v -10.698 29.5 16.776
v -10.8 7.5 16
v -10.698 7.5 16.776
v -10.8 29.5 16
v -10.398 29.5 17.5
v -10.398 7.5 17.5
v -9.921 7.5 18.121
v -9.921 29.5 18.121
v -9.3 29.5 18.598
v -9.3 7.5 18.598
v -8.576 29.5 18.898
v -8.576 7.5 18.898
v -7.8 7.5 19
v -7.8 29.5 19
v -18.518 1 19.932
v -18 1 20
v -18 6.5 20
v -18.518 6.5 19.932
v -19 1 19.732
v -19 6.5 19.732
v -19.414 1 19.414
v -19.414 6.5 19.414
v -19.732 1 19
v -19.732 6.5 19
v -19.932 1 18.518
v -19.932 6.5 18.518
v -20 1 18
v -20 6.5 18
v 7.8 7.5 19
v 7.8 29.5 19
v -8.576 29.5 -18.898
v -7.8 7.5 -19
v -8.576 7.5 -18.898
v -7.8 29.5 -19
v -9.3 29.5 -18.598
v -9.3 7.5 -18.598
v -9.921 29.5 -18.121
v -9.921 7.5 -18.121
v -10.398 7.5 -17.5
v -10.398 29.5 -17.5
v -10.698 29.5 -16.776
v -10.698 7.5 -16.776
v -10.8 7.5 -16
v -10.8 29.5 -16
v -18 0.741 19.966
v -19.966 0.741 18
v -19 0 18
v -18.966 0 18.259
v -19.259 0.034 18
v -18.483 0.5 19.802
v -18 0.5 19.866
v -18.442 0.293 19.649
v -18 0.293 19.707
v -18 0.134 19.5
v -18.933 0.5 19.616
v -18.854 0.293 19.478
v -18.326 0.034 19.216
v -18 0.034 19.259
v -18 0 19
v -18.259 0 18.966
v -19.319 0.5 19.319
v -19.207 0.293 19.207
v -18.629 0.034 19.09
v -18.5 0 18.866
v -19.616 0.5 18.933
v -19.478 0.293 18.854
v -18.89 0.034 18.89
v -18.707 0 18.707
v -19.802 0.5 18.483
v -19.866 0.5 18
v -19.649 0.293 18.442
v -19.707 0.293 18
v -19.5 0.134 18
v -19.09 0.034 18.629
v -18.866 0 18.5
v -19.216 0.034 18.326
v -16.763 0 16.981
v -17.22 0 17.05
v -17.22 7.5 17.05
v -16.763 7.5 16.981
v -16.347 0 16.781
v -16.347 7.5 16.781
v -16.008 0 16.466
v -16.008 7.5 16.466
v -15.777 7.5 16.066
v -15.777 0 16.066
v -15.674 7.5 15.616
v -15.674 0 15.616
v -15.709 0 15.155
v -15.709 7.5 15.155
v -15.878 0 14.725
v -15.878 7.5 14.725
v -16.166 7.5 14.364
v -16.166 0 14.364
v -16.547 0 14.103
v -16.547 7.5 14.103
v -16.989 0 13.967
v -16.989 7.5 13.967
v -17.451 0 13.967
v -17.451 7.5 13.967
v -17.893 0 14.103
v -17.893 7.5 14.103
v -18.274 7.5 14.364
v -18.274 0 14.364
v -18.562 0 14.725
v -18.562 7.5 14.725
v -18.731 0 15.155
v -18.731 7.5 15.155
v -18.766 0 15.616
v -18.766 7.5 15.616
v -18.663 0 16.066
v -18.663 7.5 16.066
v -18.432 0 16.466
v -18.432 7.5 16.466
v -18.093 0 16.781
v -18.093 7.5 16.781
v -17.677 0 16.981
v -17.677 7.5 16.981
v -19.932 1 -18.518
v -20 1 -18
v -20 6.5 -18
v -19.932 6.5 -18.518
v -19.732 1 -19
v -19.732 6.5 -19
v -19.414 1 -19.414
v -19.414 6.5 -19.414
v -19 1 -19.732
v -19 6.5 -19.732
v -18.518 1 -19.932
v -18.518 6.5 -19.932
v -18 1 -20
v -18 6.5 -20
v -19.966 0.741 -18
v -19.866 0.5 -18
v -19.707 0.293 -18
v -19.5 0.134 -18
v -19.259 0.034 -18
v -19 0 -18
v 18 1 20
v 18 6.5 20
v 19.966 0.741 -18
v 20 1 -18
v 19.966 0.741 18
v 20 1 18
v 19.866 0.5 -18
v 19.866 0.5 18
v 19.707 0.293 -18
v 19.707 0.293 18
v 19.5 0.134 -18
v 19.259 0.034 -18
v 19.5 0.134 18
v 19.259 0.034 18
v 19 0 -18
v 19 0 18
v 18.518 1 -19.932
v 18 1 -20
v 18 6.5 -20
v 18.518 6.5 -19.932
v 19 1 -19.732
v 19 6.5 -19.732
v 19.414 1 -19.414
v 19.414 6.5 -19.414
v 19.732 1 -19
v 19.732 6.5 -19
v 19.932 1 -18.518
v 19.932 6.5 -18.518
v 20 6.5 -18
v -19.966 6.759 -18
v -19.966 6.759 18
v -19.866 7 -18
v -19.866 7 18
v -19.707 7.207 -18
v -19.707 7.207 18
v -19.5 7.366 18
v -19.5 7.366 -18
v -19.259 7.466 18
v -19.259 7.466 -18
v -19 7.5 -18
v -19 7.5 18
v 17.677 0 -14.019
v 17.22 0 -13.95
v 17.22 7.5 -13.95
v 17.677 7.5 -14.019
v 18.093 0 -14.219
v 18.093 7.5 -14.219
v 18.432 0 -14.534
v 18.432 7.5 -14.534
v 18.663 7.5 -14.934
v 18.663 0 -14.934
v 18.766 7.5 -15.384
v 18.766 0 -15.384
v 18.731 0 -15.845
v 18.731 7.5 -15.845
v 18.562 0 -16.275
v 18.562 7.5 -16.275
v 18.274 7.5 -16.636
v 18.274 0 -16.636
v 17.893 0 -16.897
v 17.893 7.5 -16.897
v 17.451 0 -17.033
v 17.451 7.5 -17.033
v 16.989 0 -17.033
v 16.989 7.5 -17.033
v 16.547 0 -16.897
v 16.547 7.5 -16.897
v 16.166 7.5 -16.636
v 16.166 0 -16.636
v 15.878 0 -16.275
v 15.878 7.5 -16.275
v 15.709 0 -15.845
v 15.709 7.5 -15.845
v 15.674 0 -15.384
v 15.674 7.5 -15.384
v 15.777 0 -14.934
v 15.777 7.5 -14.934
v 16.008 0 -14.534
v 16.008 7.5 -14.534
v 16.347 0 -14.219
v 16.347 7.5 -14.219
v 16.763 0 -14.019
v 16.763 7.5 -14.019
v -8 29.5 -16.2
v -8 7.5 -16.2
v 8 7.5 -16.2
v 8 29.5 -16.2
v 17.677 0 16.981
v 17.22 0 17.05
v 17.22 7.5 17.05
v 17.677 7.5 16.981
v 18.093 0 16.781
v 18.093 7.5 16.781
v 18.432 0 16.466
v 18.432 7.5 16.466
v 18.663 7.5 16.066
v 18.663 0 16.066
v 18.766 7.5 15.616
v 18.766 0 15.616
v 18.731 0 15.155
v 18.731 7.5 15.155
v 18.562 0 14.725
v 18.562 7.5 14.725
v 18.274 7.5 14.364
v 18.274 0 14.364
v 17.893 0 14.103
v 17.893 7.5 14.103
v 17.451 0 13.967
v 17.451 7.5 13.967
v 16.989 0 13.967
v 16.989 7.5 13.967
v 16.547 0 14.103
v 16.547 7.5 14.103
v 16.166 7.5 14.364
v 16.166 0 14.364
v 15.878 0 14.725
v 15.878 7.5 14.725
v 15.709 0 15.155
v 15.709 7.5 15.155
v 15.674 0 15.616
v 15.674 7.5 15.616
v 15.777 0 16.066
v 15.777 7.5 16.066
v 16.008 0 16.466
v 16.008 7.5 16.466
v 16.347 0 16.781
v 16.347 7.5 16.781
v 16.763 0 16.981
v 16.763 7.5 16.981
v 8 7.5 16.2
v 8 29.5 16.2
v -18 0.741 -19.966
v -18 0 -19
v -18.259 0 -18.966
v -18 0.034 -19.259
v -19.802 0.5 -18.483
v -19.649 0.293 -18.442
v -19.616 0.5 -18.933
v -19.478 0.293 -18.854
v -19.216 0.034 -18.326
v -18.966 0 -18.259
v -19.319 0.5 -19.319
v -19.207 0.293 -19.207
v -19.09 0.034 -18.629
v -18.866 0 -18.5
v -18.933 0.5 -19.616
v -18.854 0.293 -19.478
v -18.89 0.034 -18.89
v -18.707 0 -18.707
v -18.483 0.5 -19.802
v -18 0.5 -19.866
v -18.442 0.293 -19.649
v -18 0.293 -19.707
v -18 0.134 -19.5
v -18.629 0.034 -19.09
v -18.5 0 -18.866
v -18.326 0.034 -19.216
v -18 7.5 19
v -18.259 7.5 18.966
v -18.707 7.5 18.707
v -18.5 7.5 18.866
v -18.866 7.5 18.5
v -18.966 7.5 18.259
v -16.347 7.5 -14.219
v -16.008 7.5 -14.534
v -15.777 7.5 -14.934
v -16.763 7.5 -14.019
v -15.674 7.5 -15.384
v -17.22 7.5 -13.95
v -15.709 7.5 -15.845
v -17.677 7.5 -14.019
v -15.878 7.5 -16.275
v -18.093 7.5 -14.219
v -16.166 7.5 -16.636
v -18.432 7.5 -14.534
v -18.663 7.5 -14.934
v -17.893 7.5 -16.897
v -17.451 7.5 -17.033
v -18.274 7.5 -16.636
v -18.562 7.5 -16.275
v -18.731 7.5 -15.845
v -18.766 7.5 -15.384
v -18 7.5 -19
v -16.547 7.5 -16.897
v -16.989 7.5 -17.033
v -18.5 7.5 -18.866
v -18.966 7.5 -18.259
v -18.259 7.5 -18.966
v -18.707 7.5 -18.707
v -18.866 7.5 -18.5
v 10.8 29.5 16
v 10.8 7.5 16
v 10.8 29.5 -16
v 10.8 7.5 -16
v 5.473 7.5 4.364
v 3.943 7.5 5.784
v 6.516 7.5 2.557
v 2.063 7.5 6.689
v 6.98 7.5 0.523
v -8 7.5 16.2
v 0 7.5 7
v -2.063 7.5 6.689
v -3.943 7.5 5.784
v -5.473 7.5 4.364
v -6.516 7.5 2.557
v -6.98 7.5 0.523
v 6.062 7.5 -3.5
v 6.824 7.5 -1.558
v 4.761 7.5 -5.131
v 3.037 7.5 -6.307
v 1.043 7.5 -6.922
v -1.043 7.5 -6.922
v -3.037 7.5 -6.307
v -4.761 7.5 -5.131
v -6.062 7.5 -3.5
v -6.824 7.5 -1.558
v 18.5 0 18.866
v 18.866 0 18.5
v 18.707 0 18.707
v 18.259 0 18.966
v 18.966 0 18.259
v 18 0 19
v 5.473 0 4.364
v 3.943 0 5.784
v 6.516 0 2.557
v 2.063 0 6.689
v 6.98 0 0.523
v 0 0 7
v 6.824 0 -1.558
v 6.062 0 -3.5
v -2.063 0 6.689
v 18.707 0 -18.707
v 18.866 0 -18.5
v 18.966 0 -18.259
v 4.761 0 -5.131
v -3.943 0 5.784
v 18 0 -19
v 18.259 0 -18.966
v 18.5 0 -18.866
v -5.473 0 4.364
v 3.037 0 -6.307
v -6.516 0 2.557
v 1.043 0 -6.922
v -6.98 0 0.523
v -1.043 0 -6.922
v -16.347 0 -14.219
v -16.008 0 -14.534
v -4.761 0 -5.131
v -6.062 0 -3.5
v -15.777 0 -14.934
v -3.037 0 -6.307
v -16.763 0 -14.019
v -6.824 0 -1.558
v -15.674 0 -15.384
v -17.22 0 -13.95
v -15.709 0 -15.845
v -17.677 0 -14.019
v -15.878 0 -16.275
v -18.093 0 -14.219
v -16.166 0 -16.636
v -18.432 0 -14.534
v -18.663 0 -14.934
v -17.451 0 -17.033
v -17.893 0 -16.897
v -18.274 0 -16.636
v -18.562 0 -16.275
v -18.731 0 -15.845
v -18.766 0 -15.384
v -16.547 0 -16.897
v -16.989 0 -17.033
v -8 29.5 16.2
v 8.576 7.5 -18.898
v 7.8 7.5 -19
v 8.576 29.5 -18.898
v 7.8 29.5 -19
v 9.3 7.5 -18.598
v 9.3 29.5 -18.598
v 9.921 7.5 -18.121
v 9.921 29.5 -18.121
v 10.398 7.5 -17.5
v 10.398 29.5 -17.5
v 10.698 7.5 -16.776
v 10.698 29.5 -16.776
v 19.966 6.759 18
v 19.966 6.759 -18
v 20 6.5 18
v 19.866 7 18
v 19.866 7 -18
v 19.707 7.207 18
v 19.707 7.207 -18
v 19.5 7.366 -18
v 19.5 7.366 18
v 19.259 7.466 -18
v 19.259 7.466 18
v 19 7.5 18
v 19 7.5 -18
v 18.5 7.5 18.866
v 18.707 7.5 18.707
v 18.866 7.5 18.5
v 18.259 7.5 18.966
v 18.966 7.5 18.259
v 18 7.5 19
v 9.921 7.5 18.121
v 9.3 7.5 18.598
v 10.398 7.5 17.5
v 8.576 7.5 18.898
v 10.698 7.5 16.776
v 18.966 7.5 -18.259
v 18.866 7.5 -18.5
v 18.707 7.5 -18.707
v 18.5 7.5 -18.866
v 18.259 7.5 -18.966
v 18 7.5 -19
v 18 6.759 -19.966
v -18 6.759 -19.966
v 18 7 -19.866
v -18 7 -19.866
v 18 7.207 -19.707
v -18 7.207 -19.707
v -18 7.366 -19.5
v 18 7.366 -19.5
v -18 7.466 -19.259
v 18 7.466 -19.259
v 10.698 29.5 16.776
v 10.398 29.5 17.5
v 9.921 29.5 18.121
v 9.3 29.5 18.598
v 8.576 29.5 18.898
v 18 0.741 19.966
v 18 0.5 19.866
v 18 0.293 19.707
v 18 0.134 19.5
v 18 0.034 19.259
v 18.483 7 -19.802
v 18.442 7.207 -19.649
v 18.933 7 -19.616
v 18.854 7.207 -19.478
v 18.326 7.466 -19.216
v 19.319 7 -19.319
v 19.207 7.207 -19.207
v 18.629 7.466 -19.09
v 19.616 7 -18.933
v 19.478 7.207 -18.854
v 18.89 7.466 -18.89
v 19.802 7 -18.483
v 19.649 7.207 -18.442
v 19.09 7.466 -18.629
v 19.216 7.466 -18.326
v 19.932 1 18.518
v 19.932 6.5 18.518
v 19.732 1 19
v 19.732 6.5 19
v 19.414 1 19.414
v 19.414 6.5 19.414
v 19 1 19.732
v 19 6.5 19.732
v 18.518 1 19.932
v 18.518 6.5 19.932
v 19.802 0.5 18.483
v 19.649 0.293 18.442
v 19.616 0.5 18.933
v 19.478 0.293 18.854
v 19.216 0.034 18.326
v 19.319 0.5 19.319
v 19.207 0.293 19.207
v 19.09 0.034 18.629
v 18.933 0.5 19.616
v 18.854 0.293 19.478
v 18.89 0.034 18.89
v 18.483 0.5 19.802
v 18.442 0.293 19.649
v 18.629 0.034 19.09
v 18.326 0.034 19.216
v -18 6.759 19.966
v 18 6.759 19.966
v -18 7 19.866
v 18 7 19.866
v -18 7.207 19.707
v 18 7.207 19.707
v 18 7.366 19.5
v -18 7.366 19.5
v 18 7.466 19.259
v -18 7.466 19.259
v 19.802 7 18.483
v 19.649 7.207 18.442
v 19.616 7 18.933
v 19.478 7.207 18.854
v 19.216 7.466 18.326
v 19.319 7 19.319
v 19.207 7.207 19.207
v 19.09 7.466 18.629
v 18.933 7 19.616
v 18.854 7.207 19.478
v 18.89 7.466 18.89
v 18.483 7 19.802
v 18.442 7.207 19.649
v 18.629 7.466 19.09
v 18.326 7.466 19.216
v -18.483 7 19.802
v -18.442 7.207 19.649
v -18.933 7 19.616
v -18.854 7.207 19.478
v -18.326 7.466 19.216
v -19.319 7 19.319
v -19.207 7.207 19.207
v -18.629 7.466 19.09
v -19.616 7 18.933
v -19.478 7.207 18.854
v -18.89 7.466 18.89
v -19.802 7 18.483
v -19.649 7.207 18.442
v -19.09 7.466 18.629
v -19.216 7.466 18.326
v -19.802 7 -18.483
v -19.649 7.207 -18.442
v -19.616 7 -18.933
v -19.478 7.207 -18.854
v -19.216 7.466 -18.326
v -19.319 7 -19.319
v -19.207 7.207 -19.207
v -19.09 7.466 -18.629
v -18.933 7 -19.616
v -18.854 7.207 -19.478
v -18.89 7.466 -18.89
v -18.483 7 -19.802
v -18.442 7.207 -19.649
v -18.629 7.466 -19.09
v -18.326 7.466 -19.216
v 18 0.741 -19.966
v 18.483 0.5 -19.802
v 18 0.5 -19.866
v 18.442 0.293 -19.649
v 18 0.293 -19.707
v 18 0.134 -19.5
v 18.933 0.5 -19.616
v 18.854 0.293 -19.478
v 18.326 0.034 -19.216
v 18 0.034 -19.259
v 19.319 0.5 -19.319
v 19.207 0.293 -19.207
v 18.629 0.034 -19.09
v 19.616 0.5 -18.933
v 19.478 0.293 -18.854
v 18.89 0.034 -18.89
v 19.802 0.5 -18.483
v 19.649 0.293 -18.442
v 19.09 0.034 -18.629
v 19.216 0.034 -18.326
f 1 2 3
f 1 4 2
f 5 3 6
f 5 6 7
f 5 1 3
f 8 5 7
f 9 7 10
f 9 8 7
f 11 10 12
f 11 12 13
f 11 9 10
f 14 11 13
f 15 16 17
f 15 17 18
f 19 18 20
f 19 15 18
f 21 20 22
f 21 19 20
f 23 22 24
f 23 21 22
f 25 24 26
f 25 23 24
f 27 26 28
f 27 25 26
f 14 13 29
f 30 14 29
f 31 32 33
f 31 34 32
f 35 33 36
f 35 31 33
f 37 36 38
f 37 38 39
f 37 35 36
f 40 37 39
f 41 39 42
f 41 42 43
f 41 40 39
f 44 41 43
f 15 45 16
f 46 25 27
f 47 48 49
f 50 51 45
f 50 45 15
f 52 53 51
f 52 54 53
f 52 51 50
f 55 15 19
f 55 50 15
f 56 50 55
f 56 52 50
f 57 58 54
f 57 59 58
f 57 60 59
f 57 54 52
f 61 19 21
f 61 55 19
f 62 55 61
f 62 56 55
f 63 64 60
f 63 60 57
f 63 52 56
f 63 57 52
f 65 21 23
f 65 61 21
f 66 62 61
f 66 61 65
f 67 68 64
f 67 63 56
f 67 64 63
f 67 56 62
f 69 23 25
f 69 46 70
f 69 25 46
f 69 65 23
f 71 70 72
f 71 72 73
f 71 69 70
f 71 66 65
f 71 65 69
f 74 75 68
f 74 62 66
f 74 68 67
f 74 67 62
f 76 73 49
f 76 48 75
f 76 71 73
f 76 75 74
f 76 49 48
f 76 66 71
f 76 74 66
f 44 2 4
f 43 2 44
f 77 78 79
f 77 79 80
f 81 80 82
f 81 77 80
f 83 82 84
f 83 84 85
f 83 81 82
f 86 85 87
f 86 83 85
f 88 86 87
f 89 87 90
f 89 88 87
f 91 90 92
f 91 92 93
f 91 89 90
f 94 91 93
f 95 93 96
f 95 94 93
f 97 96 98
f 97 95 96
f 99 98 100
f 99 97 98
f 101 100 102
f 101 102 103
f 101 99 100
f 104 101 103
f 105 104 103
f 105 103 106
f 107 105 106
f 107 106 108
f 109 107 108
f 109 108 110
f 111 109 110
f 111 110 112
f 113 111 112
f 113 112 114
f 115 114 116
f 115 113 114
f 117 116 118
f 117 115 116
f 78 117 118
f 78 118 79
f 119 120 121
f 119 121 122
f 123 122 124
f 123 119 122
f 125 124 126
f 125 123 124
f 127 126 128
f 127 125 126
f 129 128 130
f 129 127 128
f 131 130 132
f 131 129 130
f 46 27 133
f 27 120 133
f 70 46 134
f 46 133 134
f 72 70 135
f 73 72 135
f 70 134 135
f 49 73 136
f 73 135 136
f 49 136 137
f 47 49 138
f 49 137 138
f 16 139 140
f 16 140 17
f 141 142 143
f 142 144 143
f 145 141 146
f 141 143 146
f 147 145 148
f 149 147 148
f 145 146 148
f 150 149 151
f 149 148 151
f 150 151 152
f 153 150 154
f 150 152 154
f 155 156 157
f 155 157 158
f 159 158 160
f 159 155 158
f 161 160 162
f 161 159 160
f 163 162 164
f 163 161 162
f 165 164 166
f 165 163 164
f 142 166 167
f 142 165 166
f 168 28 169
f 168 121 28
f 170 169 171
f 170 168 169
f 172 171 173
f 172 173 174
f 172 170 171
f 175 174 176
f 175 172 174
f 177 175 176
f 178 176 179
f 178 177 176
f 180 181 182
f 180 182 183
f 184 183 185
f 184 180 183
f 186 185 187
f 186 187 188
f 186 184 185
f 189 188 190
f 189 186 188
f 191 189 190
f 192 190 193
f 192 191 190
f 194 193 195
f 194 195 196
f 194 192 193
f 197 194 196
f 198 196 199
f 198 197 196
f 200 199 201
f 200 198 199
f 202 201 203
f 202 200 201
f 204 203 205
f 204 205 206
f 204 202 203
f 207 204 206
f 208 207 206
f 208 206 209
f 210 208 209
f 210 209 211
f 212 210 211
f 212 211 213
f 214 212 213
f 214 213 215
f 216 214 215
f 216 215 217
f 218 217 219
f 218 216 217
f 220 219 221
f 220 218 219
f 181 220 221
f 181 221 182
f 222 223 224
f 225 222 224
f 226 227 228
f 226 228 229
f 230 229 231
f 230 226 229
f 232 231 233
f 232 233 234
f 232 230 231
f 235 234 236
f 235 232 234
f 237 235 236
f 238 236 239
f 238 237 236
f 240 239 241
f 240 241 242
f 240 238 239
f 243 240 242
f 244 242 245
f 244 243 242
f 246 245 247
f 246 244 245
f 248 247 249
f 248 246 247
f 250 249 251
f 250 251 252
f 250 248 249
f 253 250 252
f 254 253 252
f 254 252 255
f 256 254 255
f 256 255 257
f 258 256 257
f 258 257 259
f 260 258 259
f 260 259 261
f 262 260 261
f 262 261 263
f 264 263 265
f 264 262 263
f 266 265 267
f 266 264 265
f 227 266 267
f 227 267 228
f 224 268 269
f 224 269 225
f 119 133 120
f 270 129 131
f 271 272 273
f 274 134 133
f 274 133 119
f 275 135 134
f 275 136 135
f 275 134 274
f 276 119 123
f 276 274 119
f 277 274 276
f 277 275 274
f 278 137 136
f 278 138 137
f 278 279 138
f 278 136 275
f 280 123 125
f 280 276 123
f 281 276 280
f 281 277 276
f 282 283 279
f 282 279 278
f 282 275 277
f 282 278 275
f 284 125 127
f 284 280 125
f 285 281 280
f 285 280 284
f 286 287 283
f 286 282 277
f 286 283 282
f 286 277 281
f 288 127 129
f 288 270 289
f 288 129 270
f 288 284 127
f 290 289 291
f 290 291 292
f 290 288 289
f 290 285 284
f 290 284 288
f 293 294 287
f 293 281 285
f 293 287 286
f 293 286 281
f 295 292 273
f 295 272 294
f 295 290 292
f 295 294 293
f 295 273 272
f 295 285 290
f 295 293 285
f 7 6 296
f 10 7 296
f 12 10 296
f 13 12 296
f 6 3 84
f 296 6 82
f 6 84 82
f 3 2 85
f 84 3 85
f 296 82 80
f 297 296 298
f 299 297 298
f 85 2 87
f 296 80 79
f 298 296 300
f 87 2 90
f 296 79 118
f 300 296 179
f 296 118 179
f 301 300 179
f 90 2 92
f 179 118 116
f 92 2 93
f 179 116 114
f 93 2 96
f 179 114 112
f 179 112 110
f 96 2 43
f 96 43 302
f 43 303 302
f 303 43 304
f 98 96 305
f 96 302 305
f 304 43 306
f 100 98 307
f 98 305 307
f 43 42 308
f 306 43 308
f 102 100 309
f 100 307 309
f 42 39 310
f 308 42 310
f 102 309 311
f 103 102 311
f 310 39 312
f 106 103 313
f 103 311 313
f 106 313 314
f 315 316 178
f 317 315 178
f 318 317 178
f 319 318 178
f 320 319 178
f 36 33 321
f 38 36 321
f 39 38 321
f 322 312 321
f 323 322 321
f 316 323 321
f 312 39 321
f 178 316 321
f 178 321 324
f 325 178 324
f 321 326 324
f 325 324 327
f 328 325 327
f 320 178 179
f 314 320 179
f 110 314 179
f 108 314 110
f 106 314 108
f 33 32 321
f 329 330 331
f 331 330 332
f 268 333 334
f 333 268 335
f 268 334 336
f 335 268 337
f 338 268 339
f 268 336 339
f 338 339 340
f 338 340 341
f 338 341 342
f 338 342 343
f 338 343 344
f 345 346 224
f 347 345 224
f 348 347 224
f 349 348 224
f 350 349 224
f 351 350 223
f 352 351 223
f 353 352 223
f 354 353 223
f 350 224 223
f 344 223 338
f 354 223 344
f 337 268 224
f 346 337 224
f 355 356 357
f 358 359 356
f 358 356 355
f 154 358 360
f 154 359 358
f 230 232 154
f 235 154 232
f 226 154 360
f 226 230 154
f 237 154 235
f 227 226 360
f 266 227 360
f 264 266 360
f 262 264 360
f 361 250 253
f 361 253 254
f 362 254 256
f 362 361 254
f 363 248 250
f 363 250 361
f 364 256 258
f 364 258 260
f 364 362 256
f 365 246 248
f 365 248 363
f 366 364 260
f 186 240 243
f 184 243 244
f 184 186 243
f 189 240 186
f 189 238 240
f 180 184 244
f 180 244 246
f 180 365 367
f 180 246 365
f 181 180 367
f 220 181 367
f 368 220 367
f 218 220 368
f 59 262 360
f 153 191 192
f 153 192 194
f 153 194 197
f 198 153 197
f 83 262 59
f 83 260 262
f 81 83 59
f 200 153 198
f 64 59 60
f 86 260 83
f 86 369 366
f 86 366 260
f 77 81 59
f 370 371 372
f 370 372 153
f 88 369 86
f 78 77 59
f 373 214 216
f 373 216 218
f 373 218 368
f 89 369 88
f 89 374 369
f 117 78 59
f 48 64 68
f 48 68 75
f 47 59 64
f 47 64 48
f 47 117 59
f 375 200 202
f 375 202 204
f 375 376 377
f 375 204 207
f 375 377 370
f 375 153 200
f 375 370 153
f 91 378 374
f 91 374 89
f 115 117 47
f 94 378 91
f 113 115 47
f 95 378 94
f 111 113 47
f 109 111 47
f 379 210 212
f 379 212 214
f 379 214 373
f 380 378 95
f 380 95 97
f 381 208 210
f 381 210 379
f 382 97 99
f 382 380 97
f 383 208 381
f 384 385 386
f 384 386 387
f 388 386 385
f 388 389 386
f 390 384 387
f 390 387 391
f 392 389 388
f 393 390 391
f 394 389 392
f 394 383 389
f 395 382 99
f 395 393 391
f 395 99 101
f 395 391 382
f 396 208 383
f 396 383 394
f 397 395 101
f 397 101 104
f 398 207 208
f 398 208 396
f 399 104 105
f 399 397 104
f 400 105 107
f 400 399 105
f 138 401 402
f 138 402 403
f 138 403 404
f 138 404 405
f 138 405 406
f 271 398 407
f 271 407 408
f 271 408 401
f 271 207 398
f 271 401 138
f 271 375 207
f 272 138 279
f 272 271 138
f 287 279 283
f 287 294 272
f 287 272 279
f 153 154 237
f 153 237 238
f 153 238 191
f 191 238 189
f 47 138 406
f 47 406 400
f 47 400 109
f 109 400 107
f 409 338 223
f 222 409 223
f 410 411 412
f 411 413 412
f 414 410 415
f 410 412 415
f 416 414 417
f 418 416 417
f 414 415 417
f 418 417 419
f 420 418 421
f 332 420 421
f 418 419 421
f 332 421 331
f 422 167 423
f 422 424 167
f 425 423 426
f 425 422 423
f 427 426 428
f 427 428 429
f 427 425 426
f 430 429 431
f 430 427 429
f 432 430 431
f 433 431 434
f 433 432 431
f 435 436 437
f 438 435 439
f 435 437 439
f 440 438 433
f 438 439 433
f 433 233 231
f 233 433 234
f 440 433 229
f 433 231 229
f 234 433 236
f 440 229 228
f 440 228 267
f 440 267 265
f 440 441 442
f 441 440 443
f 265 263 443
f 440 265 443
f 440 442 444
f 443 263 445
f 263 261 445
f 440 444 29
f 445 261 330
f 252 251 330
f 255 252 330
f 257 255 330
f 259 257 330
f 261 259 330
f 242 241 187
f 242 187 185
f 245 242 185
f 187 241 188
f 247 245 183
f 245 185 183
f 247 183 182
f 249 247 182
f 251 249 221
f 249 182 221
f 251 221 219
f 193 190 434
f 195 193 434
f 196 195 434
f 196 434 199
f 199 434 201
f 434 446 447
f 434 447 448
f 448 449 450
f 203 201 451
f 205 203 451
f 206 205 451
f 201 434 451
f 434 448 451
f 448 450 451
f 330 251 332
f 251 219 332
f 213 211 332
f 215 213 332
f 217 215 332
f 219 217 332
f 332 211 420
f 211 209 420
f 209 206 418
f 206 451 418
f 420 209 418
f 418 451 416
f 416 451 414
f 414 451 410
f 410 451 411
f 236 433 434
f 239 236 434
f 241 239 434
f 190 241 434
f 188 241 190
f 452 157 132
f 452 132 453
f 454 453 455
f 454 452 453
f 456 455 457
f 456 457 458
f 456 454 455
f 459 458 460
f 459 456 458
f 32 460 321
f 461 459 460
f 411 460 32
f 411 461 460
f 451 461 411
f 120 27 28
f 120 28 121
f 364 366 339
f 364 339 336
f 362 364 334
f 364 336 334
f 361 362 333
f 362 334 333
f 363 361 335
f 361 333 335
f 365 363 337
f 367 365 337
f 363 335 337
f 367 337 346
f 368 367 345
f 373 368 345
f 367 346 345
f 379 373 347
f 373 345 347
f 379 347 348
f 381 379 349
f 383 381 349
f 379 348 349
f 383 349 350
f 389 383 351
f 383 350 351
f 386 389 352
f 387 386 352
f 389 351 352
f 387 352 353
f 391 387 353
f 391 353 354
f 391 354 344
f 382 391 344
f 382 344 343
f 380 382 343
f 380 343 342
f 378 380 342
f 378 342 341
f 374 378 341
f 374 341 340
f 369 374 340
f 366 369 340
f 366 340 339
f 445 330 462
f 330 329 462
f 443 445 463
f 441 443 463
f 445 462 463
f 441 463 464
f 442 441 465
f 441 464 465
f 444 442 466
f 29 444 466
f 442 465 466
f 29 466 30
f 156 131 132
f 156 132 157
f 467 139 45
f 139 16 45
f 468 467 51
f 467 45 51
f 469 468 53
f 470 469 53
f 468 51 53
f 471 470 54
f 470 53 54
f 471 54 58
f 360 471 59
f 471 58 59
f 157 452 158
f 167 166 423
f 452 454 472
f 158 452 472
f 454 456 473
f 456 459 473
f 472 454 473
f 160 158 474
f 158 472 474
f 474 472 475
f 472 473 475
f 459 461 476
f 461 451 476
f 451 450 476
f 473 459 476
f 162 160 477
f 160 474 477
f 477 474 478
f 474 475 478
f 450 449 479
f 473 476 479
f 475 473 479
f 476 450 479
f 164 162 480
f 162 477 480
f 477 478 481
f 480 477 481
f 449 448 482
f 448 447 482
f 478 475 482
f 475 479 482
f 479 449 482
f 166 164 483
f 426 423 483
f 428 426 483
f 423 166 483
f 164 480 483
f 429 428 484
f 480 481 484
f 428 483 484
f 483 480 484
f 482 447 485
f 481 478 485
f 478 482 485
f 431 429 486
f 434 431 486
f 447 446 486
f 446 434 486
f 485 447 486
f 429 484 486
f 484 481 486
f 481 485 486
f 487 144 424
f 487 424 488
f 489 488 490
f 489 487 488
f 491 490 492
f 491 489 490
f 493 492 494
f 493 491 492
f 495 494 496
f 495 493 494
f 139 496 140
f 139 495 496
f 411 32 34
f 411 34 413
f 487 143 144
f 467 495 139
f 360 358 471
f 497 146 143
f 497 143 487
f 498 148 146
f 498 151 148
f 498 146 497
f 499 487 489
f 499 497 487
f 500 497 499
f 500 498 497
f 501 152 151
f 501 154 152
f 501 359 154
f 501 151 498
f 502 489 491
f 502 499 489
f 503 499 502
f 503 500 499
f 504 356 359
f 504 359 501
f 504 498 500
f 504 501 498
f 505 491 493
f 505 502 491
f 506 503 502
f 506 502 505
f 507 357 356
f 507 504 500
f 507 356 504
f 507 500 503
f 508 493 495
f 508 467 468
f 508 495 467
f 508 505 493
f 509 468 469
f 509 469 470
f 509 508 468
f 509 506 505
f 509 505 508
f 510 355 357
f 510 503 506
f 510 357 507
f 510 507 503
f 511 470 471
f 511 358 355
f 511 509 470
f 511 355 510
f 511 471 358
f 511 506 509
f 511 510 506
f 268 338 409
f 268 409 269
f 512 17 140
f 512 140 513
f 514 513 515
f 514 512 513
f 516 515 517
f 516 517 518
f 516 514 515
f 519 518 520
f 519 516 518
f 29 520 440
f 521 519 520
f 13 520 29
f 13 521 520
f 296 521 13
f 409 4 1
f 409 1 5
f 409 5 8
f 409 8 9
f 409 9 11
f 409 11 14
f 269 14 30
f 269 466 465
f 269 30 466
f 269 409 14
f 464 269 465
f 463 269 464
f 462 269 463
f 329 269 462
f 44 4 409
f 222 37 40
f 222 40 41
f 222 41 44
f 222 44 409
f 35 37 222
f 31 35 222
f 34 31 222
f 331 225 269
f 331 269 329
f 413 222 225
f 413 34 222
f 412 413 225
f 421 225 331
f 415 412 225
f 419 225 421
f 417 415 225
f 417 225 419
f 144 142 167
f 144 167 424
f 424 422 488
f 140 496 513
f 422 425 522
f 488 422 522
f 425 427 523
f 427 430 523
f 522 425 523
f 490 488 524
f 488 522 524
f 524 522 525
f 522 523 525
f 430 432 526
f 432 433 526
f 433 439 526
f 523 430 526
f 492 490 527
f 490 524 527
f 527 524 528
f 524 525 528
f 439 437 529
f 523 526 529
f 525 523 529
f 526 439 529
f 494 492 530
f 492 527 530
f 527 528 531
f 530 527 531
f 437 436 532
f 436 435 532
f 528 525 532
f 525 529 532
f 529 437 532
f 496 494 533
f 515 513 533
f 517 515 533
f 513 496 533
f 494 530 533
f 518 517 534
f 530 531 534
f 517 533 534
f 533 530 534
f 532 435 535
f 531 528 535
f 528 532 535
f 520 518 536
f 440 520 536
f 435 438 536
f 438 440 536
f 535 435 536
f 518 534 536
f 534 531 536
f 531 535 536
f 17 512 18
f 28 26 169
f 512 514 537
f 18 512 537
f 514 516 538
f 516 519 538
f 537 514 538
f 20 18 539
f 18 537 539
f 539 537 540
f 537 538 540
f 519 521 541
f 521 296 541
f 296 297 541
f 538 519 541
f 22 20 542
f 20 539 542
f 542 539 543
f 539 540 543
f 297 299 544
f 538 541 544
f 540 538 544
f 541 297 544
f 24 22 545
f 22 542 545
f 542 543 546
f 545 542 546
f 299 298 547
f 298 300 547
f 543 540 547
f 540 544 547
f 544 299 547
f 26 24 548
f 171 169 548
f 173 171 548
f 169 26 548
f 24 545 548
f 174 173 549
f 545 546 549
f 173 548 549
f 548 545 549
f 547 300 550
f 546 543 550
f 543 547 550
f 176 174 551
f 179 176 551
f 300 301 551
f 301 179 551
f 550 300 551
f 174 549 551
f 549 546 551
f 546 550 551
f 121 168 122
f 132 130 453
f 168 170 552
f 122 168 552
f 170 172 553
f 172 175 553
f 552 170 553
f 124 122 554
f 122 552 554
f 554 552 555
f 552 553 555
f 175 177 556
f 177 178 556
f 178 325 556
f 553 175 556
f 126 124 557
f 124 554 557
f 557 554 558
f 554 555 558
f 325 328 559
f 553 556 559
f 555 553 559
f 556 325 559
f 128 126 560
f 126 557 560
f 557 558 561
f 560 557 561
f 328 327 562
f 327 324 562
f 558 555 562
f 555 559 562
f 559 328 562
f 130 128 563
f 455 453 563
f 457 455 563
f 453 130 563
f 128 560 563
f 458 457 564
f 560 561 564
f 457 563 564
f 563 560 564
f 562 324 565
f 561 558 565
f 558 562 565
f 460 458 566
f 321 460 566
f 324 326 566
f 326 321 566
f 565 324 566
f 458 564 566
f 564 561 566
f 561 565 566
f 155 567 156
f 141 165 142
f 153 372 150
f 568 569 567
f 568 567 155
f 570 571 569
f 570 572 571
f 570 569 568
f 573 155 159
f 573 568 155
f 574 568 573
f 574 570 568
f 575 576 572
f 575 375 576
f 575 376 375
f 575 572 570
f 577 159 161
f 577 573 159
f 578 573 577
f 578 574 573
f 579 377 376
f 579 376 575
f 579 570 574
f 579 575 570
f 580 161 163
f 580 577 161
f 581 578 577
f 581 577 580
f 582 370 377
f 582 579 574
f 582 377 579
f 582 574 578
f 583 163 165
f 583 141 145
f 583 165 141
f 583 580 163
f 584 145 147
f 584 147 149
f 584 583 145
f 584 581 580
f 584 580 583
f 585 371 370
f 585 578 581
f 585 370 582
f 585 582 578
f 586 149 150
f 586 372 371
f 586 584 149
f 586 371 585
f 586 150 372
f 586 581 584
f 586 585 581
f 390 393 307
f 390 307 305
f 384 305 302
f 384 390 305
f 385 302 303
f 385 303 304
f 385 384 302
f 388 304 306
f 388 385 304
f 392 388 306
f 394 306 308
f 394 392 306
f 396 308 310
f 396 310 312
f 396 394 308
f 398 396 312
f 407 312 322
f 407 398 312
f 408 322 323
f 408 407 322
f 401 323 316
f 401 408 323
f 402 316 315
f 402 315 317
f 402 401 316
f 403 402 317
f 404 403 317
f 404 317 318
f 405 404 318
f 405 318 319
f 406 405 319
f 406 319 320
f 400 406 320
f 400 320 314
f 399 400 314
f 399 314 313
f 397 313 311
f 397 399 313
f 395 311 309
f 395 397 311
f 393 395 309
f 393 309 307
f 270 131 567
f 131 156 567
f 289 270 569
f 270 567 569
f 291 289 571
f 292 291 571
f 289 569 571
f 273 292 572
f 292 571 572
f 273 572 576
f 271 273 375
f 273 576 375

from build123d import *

# Parameters (mm, degrees)
SKETCH1_R           = 1.55
BOSS_EXTRUDE1_DEPTH = 7.5
FILLET2_R           = 1
SKETCH2_R           = 7
CUT_EXTRUDE1_DEPTH  = 10
SKETCH3_W           = 21.6
SKETCH3_H           = 38
SKETCH3_W_2         = 16
SKETCH3_H_2         = 32.4
BOSS_EXTRUDE9_DEPTH = 22
FILLET6_R           = 3


with BuildPart() as part:
    # Sketch1 → Boss-Extrude1 (new body)
    with BuildSketch(Plane(origin=(0, 0, 0), x_dir=(1, 0, 0), z_dir=(0, 1, 0))):
        with BuildLine():
            Line((-18, 20), (18, 20))
            ThreePointArc((18, 20), (19.414213562, 19.414213562), (20, 18))
            Line((20, 18), (20, -18))
            ThreePointArc((20, -18), (19.414213562, -19.414213562), (18, -20))
            Line((18, -20), (-18, -20))
            ThreePointArc((-18, -20), (-19.414213562, -19.414213562), (-20, -18))
            Line((-20, -18), (-20, 18))
            ThreePointArc((-20, 18), (-19.414213562, 19.414213562), (-18, 20))
        make_face()
        with Locations(Location((-17.22, 15.5, 0), (0, 0, 270))):
            Circle(SKETCH1_R, mode=Mode.SUBTRACT)
        with Locations(Location((-17.22, -15.5, 0), (0, 0, 270))):
            Circle(SKETCH1_R, mode=Mode.SUBTRACT)
        with Locations(Location((17.22, 15.5, 0), (0, 0, 270))):
            Circle(SKETCH1_R, mode=Mode.SUBTRACT)
        with Locations(Location((17.22, -15.5, 0), (0, 0, 270))):
            Circle(SKETCH1_R, mode=Mode.SUBTRACT)
    extrude(amount=BOSS_EXTRUDE1_DEPTH)

    # Fillet2
    fillet2_edges = [part.edges().sort_by_distance(p)[0] for p in [
        (0, 0, -20),
        (19.414213562, 0, -19.414213562),
        (20, 0, 0),
        (19.414213562, 0, 19.414213562),
        (19.414213562, 7.5, -19.414213562),
        (0, 7.5, -20),
        (-19.414213562, 7.5, -19.414213562),
        (-20, 7.5, 0),
        (-19.414213562, 7.5, 19.414213562),
        (0, 7.5, 20),
        (19.414213562, 7.5, 19.414213562),
        (0, 0, 20),
        (20, 7.5, 0),
        (-19.414213562, 0, 19.414213562),
        (-20, 0, 0),
        (-19.414213562, 0, -19.414213562),
    ]]
    fillet(fillet2_edges, radius=FILLET2_R)

    # Sketch2 → Cut-Extrude1 (cut)
    with BuildSketch(Plane(origin=(0, 7.5, 0), x_dir=(1, 0, 0), z_dir=(0, 1, 0))):
        with Locations(Location((0, 0, 0), (0, 0, 270))):
            Circle(SKETCH2_R)
    extrude(amount=-CUT_EXTRUDE1_DEPTH, mode=Mode.SUBTRACT)

    # Sketch3 → Boss-Extrude9 (add)
    with BuildSketch(Plane(origin=(0, 7.5, 0), x_dir=(1, 0, 0), z_dir=(0, 1, 0))):
        Rectangle(SKETCH3_W, SKETCH3_H)
        Rectangle(SKETCH3_W_2, SKETCH3_H_2, mode=Mode.SUBTRACT)
    extrude(amount=BOSS_EXTRUDE9_DEPTH)

    # Fillet6
    fillet6_edges = [part.edges().sort_by_distance(p)[0] for p in [
        (-10.8, 18.5, -19),
        (-10.8, 18.5, 19),
        (10.8, 18.5, 19),
        (10.8, 18.5, -19),
    ]]
    fillet(fillet6_edges, radius=FILLET6_R)


solid = part.part
